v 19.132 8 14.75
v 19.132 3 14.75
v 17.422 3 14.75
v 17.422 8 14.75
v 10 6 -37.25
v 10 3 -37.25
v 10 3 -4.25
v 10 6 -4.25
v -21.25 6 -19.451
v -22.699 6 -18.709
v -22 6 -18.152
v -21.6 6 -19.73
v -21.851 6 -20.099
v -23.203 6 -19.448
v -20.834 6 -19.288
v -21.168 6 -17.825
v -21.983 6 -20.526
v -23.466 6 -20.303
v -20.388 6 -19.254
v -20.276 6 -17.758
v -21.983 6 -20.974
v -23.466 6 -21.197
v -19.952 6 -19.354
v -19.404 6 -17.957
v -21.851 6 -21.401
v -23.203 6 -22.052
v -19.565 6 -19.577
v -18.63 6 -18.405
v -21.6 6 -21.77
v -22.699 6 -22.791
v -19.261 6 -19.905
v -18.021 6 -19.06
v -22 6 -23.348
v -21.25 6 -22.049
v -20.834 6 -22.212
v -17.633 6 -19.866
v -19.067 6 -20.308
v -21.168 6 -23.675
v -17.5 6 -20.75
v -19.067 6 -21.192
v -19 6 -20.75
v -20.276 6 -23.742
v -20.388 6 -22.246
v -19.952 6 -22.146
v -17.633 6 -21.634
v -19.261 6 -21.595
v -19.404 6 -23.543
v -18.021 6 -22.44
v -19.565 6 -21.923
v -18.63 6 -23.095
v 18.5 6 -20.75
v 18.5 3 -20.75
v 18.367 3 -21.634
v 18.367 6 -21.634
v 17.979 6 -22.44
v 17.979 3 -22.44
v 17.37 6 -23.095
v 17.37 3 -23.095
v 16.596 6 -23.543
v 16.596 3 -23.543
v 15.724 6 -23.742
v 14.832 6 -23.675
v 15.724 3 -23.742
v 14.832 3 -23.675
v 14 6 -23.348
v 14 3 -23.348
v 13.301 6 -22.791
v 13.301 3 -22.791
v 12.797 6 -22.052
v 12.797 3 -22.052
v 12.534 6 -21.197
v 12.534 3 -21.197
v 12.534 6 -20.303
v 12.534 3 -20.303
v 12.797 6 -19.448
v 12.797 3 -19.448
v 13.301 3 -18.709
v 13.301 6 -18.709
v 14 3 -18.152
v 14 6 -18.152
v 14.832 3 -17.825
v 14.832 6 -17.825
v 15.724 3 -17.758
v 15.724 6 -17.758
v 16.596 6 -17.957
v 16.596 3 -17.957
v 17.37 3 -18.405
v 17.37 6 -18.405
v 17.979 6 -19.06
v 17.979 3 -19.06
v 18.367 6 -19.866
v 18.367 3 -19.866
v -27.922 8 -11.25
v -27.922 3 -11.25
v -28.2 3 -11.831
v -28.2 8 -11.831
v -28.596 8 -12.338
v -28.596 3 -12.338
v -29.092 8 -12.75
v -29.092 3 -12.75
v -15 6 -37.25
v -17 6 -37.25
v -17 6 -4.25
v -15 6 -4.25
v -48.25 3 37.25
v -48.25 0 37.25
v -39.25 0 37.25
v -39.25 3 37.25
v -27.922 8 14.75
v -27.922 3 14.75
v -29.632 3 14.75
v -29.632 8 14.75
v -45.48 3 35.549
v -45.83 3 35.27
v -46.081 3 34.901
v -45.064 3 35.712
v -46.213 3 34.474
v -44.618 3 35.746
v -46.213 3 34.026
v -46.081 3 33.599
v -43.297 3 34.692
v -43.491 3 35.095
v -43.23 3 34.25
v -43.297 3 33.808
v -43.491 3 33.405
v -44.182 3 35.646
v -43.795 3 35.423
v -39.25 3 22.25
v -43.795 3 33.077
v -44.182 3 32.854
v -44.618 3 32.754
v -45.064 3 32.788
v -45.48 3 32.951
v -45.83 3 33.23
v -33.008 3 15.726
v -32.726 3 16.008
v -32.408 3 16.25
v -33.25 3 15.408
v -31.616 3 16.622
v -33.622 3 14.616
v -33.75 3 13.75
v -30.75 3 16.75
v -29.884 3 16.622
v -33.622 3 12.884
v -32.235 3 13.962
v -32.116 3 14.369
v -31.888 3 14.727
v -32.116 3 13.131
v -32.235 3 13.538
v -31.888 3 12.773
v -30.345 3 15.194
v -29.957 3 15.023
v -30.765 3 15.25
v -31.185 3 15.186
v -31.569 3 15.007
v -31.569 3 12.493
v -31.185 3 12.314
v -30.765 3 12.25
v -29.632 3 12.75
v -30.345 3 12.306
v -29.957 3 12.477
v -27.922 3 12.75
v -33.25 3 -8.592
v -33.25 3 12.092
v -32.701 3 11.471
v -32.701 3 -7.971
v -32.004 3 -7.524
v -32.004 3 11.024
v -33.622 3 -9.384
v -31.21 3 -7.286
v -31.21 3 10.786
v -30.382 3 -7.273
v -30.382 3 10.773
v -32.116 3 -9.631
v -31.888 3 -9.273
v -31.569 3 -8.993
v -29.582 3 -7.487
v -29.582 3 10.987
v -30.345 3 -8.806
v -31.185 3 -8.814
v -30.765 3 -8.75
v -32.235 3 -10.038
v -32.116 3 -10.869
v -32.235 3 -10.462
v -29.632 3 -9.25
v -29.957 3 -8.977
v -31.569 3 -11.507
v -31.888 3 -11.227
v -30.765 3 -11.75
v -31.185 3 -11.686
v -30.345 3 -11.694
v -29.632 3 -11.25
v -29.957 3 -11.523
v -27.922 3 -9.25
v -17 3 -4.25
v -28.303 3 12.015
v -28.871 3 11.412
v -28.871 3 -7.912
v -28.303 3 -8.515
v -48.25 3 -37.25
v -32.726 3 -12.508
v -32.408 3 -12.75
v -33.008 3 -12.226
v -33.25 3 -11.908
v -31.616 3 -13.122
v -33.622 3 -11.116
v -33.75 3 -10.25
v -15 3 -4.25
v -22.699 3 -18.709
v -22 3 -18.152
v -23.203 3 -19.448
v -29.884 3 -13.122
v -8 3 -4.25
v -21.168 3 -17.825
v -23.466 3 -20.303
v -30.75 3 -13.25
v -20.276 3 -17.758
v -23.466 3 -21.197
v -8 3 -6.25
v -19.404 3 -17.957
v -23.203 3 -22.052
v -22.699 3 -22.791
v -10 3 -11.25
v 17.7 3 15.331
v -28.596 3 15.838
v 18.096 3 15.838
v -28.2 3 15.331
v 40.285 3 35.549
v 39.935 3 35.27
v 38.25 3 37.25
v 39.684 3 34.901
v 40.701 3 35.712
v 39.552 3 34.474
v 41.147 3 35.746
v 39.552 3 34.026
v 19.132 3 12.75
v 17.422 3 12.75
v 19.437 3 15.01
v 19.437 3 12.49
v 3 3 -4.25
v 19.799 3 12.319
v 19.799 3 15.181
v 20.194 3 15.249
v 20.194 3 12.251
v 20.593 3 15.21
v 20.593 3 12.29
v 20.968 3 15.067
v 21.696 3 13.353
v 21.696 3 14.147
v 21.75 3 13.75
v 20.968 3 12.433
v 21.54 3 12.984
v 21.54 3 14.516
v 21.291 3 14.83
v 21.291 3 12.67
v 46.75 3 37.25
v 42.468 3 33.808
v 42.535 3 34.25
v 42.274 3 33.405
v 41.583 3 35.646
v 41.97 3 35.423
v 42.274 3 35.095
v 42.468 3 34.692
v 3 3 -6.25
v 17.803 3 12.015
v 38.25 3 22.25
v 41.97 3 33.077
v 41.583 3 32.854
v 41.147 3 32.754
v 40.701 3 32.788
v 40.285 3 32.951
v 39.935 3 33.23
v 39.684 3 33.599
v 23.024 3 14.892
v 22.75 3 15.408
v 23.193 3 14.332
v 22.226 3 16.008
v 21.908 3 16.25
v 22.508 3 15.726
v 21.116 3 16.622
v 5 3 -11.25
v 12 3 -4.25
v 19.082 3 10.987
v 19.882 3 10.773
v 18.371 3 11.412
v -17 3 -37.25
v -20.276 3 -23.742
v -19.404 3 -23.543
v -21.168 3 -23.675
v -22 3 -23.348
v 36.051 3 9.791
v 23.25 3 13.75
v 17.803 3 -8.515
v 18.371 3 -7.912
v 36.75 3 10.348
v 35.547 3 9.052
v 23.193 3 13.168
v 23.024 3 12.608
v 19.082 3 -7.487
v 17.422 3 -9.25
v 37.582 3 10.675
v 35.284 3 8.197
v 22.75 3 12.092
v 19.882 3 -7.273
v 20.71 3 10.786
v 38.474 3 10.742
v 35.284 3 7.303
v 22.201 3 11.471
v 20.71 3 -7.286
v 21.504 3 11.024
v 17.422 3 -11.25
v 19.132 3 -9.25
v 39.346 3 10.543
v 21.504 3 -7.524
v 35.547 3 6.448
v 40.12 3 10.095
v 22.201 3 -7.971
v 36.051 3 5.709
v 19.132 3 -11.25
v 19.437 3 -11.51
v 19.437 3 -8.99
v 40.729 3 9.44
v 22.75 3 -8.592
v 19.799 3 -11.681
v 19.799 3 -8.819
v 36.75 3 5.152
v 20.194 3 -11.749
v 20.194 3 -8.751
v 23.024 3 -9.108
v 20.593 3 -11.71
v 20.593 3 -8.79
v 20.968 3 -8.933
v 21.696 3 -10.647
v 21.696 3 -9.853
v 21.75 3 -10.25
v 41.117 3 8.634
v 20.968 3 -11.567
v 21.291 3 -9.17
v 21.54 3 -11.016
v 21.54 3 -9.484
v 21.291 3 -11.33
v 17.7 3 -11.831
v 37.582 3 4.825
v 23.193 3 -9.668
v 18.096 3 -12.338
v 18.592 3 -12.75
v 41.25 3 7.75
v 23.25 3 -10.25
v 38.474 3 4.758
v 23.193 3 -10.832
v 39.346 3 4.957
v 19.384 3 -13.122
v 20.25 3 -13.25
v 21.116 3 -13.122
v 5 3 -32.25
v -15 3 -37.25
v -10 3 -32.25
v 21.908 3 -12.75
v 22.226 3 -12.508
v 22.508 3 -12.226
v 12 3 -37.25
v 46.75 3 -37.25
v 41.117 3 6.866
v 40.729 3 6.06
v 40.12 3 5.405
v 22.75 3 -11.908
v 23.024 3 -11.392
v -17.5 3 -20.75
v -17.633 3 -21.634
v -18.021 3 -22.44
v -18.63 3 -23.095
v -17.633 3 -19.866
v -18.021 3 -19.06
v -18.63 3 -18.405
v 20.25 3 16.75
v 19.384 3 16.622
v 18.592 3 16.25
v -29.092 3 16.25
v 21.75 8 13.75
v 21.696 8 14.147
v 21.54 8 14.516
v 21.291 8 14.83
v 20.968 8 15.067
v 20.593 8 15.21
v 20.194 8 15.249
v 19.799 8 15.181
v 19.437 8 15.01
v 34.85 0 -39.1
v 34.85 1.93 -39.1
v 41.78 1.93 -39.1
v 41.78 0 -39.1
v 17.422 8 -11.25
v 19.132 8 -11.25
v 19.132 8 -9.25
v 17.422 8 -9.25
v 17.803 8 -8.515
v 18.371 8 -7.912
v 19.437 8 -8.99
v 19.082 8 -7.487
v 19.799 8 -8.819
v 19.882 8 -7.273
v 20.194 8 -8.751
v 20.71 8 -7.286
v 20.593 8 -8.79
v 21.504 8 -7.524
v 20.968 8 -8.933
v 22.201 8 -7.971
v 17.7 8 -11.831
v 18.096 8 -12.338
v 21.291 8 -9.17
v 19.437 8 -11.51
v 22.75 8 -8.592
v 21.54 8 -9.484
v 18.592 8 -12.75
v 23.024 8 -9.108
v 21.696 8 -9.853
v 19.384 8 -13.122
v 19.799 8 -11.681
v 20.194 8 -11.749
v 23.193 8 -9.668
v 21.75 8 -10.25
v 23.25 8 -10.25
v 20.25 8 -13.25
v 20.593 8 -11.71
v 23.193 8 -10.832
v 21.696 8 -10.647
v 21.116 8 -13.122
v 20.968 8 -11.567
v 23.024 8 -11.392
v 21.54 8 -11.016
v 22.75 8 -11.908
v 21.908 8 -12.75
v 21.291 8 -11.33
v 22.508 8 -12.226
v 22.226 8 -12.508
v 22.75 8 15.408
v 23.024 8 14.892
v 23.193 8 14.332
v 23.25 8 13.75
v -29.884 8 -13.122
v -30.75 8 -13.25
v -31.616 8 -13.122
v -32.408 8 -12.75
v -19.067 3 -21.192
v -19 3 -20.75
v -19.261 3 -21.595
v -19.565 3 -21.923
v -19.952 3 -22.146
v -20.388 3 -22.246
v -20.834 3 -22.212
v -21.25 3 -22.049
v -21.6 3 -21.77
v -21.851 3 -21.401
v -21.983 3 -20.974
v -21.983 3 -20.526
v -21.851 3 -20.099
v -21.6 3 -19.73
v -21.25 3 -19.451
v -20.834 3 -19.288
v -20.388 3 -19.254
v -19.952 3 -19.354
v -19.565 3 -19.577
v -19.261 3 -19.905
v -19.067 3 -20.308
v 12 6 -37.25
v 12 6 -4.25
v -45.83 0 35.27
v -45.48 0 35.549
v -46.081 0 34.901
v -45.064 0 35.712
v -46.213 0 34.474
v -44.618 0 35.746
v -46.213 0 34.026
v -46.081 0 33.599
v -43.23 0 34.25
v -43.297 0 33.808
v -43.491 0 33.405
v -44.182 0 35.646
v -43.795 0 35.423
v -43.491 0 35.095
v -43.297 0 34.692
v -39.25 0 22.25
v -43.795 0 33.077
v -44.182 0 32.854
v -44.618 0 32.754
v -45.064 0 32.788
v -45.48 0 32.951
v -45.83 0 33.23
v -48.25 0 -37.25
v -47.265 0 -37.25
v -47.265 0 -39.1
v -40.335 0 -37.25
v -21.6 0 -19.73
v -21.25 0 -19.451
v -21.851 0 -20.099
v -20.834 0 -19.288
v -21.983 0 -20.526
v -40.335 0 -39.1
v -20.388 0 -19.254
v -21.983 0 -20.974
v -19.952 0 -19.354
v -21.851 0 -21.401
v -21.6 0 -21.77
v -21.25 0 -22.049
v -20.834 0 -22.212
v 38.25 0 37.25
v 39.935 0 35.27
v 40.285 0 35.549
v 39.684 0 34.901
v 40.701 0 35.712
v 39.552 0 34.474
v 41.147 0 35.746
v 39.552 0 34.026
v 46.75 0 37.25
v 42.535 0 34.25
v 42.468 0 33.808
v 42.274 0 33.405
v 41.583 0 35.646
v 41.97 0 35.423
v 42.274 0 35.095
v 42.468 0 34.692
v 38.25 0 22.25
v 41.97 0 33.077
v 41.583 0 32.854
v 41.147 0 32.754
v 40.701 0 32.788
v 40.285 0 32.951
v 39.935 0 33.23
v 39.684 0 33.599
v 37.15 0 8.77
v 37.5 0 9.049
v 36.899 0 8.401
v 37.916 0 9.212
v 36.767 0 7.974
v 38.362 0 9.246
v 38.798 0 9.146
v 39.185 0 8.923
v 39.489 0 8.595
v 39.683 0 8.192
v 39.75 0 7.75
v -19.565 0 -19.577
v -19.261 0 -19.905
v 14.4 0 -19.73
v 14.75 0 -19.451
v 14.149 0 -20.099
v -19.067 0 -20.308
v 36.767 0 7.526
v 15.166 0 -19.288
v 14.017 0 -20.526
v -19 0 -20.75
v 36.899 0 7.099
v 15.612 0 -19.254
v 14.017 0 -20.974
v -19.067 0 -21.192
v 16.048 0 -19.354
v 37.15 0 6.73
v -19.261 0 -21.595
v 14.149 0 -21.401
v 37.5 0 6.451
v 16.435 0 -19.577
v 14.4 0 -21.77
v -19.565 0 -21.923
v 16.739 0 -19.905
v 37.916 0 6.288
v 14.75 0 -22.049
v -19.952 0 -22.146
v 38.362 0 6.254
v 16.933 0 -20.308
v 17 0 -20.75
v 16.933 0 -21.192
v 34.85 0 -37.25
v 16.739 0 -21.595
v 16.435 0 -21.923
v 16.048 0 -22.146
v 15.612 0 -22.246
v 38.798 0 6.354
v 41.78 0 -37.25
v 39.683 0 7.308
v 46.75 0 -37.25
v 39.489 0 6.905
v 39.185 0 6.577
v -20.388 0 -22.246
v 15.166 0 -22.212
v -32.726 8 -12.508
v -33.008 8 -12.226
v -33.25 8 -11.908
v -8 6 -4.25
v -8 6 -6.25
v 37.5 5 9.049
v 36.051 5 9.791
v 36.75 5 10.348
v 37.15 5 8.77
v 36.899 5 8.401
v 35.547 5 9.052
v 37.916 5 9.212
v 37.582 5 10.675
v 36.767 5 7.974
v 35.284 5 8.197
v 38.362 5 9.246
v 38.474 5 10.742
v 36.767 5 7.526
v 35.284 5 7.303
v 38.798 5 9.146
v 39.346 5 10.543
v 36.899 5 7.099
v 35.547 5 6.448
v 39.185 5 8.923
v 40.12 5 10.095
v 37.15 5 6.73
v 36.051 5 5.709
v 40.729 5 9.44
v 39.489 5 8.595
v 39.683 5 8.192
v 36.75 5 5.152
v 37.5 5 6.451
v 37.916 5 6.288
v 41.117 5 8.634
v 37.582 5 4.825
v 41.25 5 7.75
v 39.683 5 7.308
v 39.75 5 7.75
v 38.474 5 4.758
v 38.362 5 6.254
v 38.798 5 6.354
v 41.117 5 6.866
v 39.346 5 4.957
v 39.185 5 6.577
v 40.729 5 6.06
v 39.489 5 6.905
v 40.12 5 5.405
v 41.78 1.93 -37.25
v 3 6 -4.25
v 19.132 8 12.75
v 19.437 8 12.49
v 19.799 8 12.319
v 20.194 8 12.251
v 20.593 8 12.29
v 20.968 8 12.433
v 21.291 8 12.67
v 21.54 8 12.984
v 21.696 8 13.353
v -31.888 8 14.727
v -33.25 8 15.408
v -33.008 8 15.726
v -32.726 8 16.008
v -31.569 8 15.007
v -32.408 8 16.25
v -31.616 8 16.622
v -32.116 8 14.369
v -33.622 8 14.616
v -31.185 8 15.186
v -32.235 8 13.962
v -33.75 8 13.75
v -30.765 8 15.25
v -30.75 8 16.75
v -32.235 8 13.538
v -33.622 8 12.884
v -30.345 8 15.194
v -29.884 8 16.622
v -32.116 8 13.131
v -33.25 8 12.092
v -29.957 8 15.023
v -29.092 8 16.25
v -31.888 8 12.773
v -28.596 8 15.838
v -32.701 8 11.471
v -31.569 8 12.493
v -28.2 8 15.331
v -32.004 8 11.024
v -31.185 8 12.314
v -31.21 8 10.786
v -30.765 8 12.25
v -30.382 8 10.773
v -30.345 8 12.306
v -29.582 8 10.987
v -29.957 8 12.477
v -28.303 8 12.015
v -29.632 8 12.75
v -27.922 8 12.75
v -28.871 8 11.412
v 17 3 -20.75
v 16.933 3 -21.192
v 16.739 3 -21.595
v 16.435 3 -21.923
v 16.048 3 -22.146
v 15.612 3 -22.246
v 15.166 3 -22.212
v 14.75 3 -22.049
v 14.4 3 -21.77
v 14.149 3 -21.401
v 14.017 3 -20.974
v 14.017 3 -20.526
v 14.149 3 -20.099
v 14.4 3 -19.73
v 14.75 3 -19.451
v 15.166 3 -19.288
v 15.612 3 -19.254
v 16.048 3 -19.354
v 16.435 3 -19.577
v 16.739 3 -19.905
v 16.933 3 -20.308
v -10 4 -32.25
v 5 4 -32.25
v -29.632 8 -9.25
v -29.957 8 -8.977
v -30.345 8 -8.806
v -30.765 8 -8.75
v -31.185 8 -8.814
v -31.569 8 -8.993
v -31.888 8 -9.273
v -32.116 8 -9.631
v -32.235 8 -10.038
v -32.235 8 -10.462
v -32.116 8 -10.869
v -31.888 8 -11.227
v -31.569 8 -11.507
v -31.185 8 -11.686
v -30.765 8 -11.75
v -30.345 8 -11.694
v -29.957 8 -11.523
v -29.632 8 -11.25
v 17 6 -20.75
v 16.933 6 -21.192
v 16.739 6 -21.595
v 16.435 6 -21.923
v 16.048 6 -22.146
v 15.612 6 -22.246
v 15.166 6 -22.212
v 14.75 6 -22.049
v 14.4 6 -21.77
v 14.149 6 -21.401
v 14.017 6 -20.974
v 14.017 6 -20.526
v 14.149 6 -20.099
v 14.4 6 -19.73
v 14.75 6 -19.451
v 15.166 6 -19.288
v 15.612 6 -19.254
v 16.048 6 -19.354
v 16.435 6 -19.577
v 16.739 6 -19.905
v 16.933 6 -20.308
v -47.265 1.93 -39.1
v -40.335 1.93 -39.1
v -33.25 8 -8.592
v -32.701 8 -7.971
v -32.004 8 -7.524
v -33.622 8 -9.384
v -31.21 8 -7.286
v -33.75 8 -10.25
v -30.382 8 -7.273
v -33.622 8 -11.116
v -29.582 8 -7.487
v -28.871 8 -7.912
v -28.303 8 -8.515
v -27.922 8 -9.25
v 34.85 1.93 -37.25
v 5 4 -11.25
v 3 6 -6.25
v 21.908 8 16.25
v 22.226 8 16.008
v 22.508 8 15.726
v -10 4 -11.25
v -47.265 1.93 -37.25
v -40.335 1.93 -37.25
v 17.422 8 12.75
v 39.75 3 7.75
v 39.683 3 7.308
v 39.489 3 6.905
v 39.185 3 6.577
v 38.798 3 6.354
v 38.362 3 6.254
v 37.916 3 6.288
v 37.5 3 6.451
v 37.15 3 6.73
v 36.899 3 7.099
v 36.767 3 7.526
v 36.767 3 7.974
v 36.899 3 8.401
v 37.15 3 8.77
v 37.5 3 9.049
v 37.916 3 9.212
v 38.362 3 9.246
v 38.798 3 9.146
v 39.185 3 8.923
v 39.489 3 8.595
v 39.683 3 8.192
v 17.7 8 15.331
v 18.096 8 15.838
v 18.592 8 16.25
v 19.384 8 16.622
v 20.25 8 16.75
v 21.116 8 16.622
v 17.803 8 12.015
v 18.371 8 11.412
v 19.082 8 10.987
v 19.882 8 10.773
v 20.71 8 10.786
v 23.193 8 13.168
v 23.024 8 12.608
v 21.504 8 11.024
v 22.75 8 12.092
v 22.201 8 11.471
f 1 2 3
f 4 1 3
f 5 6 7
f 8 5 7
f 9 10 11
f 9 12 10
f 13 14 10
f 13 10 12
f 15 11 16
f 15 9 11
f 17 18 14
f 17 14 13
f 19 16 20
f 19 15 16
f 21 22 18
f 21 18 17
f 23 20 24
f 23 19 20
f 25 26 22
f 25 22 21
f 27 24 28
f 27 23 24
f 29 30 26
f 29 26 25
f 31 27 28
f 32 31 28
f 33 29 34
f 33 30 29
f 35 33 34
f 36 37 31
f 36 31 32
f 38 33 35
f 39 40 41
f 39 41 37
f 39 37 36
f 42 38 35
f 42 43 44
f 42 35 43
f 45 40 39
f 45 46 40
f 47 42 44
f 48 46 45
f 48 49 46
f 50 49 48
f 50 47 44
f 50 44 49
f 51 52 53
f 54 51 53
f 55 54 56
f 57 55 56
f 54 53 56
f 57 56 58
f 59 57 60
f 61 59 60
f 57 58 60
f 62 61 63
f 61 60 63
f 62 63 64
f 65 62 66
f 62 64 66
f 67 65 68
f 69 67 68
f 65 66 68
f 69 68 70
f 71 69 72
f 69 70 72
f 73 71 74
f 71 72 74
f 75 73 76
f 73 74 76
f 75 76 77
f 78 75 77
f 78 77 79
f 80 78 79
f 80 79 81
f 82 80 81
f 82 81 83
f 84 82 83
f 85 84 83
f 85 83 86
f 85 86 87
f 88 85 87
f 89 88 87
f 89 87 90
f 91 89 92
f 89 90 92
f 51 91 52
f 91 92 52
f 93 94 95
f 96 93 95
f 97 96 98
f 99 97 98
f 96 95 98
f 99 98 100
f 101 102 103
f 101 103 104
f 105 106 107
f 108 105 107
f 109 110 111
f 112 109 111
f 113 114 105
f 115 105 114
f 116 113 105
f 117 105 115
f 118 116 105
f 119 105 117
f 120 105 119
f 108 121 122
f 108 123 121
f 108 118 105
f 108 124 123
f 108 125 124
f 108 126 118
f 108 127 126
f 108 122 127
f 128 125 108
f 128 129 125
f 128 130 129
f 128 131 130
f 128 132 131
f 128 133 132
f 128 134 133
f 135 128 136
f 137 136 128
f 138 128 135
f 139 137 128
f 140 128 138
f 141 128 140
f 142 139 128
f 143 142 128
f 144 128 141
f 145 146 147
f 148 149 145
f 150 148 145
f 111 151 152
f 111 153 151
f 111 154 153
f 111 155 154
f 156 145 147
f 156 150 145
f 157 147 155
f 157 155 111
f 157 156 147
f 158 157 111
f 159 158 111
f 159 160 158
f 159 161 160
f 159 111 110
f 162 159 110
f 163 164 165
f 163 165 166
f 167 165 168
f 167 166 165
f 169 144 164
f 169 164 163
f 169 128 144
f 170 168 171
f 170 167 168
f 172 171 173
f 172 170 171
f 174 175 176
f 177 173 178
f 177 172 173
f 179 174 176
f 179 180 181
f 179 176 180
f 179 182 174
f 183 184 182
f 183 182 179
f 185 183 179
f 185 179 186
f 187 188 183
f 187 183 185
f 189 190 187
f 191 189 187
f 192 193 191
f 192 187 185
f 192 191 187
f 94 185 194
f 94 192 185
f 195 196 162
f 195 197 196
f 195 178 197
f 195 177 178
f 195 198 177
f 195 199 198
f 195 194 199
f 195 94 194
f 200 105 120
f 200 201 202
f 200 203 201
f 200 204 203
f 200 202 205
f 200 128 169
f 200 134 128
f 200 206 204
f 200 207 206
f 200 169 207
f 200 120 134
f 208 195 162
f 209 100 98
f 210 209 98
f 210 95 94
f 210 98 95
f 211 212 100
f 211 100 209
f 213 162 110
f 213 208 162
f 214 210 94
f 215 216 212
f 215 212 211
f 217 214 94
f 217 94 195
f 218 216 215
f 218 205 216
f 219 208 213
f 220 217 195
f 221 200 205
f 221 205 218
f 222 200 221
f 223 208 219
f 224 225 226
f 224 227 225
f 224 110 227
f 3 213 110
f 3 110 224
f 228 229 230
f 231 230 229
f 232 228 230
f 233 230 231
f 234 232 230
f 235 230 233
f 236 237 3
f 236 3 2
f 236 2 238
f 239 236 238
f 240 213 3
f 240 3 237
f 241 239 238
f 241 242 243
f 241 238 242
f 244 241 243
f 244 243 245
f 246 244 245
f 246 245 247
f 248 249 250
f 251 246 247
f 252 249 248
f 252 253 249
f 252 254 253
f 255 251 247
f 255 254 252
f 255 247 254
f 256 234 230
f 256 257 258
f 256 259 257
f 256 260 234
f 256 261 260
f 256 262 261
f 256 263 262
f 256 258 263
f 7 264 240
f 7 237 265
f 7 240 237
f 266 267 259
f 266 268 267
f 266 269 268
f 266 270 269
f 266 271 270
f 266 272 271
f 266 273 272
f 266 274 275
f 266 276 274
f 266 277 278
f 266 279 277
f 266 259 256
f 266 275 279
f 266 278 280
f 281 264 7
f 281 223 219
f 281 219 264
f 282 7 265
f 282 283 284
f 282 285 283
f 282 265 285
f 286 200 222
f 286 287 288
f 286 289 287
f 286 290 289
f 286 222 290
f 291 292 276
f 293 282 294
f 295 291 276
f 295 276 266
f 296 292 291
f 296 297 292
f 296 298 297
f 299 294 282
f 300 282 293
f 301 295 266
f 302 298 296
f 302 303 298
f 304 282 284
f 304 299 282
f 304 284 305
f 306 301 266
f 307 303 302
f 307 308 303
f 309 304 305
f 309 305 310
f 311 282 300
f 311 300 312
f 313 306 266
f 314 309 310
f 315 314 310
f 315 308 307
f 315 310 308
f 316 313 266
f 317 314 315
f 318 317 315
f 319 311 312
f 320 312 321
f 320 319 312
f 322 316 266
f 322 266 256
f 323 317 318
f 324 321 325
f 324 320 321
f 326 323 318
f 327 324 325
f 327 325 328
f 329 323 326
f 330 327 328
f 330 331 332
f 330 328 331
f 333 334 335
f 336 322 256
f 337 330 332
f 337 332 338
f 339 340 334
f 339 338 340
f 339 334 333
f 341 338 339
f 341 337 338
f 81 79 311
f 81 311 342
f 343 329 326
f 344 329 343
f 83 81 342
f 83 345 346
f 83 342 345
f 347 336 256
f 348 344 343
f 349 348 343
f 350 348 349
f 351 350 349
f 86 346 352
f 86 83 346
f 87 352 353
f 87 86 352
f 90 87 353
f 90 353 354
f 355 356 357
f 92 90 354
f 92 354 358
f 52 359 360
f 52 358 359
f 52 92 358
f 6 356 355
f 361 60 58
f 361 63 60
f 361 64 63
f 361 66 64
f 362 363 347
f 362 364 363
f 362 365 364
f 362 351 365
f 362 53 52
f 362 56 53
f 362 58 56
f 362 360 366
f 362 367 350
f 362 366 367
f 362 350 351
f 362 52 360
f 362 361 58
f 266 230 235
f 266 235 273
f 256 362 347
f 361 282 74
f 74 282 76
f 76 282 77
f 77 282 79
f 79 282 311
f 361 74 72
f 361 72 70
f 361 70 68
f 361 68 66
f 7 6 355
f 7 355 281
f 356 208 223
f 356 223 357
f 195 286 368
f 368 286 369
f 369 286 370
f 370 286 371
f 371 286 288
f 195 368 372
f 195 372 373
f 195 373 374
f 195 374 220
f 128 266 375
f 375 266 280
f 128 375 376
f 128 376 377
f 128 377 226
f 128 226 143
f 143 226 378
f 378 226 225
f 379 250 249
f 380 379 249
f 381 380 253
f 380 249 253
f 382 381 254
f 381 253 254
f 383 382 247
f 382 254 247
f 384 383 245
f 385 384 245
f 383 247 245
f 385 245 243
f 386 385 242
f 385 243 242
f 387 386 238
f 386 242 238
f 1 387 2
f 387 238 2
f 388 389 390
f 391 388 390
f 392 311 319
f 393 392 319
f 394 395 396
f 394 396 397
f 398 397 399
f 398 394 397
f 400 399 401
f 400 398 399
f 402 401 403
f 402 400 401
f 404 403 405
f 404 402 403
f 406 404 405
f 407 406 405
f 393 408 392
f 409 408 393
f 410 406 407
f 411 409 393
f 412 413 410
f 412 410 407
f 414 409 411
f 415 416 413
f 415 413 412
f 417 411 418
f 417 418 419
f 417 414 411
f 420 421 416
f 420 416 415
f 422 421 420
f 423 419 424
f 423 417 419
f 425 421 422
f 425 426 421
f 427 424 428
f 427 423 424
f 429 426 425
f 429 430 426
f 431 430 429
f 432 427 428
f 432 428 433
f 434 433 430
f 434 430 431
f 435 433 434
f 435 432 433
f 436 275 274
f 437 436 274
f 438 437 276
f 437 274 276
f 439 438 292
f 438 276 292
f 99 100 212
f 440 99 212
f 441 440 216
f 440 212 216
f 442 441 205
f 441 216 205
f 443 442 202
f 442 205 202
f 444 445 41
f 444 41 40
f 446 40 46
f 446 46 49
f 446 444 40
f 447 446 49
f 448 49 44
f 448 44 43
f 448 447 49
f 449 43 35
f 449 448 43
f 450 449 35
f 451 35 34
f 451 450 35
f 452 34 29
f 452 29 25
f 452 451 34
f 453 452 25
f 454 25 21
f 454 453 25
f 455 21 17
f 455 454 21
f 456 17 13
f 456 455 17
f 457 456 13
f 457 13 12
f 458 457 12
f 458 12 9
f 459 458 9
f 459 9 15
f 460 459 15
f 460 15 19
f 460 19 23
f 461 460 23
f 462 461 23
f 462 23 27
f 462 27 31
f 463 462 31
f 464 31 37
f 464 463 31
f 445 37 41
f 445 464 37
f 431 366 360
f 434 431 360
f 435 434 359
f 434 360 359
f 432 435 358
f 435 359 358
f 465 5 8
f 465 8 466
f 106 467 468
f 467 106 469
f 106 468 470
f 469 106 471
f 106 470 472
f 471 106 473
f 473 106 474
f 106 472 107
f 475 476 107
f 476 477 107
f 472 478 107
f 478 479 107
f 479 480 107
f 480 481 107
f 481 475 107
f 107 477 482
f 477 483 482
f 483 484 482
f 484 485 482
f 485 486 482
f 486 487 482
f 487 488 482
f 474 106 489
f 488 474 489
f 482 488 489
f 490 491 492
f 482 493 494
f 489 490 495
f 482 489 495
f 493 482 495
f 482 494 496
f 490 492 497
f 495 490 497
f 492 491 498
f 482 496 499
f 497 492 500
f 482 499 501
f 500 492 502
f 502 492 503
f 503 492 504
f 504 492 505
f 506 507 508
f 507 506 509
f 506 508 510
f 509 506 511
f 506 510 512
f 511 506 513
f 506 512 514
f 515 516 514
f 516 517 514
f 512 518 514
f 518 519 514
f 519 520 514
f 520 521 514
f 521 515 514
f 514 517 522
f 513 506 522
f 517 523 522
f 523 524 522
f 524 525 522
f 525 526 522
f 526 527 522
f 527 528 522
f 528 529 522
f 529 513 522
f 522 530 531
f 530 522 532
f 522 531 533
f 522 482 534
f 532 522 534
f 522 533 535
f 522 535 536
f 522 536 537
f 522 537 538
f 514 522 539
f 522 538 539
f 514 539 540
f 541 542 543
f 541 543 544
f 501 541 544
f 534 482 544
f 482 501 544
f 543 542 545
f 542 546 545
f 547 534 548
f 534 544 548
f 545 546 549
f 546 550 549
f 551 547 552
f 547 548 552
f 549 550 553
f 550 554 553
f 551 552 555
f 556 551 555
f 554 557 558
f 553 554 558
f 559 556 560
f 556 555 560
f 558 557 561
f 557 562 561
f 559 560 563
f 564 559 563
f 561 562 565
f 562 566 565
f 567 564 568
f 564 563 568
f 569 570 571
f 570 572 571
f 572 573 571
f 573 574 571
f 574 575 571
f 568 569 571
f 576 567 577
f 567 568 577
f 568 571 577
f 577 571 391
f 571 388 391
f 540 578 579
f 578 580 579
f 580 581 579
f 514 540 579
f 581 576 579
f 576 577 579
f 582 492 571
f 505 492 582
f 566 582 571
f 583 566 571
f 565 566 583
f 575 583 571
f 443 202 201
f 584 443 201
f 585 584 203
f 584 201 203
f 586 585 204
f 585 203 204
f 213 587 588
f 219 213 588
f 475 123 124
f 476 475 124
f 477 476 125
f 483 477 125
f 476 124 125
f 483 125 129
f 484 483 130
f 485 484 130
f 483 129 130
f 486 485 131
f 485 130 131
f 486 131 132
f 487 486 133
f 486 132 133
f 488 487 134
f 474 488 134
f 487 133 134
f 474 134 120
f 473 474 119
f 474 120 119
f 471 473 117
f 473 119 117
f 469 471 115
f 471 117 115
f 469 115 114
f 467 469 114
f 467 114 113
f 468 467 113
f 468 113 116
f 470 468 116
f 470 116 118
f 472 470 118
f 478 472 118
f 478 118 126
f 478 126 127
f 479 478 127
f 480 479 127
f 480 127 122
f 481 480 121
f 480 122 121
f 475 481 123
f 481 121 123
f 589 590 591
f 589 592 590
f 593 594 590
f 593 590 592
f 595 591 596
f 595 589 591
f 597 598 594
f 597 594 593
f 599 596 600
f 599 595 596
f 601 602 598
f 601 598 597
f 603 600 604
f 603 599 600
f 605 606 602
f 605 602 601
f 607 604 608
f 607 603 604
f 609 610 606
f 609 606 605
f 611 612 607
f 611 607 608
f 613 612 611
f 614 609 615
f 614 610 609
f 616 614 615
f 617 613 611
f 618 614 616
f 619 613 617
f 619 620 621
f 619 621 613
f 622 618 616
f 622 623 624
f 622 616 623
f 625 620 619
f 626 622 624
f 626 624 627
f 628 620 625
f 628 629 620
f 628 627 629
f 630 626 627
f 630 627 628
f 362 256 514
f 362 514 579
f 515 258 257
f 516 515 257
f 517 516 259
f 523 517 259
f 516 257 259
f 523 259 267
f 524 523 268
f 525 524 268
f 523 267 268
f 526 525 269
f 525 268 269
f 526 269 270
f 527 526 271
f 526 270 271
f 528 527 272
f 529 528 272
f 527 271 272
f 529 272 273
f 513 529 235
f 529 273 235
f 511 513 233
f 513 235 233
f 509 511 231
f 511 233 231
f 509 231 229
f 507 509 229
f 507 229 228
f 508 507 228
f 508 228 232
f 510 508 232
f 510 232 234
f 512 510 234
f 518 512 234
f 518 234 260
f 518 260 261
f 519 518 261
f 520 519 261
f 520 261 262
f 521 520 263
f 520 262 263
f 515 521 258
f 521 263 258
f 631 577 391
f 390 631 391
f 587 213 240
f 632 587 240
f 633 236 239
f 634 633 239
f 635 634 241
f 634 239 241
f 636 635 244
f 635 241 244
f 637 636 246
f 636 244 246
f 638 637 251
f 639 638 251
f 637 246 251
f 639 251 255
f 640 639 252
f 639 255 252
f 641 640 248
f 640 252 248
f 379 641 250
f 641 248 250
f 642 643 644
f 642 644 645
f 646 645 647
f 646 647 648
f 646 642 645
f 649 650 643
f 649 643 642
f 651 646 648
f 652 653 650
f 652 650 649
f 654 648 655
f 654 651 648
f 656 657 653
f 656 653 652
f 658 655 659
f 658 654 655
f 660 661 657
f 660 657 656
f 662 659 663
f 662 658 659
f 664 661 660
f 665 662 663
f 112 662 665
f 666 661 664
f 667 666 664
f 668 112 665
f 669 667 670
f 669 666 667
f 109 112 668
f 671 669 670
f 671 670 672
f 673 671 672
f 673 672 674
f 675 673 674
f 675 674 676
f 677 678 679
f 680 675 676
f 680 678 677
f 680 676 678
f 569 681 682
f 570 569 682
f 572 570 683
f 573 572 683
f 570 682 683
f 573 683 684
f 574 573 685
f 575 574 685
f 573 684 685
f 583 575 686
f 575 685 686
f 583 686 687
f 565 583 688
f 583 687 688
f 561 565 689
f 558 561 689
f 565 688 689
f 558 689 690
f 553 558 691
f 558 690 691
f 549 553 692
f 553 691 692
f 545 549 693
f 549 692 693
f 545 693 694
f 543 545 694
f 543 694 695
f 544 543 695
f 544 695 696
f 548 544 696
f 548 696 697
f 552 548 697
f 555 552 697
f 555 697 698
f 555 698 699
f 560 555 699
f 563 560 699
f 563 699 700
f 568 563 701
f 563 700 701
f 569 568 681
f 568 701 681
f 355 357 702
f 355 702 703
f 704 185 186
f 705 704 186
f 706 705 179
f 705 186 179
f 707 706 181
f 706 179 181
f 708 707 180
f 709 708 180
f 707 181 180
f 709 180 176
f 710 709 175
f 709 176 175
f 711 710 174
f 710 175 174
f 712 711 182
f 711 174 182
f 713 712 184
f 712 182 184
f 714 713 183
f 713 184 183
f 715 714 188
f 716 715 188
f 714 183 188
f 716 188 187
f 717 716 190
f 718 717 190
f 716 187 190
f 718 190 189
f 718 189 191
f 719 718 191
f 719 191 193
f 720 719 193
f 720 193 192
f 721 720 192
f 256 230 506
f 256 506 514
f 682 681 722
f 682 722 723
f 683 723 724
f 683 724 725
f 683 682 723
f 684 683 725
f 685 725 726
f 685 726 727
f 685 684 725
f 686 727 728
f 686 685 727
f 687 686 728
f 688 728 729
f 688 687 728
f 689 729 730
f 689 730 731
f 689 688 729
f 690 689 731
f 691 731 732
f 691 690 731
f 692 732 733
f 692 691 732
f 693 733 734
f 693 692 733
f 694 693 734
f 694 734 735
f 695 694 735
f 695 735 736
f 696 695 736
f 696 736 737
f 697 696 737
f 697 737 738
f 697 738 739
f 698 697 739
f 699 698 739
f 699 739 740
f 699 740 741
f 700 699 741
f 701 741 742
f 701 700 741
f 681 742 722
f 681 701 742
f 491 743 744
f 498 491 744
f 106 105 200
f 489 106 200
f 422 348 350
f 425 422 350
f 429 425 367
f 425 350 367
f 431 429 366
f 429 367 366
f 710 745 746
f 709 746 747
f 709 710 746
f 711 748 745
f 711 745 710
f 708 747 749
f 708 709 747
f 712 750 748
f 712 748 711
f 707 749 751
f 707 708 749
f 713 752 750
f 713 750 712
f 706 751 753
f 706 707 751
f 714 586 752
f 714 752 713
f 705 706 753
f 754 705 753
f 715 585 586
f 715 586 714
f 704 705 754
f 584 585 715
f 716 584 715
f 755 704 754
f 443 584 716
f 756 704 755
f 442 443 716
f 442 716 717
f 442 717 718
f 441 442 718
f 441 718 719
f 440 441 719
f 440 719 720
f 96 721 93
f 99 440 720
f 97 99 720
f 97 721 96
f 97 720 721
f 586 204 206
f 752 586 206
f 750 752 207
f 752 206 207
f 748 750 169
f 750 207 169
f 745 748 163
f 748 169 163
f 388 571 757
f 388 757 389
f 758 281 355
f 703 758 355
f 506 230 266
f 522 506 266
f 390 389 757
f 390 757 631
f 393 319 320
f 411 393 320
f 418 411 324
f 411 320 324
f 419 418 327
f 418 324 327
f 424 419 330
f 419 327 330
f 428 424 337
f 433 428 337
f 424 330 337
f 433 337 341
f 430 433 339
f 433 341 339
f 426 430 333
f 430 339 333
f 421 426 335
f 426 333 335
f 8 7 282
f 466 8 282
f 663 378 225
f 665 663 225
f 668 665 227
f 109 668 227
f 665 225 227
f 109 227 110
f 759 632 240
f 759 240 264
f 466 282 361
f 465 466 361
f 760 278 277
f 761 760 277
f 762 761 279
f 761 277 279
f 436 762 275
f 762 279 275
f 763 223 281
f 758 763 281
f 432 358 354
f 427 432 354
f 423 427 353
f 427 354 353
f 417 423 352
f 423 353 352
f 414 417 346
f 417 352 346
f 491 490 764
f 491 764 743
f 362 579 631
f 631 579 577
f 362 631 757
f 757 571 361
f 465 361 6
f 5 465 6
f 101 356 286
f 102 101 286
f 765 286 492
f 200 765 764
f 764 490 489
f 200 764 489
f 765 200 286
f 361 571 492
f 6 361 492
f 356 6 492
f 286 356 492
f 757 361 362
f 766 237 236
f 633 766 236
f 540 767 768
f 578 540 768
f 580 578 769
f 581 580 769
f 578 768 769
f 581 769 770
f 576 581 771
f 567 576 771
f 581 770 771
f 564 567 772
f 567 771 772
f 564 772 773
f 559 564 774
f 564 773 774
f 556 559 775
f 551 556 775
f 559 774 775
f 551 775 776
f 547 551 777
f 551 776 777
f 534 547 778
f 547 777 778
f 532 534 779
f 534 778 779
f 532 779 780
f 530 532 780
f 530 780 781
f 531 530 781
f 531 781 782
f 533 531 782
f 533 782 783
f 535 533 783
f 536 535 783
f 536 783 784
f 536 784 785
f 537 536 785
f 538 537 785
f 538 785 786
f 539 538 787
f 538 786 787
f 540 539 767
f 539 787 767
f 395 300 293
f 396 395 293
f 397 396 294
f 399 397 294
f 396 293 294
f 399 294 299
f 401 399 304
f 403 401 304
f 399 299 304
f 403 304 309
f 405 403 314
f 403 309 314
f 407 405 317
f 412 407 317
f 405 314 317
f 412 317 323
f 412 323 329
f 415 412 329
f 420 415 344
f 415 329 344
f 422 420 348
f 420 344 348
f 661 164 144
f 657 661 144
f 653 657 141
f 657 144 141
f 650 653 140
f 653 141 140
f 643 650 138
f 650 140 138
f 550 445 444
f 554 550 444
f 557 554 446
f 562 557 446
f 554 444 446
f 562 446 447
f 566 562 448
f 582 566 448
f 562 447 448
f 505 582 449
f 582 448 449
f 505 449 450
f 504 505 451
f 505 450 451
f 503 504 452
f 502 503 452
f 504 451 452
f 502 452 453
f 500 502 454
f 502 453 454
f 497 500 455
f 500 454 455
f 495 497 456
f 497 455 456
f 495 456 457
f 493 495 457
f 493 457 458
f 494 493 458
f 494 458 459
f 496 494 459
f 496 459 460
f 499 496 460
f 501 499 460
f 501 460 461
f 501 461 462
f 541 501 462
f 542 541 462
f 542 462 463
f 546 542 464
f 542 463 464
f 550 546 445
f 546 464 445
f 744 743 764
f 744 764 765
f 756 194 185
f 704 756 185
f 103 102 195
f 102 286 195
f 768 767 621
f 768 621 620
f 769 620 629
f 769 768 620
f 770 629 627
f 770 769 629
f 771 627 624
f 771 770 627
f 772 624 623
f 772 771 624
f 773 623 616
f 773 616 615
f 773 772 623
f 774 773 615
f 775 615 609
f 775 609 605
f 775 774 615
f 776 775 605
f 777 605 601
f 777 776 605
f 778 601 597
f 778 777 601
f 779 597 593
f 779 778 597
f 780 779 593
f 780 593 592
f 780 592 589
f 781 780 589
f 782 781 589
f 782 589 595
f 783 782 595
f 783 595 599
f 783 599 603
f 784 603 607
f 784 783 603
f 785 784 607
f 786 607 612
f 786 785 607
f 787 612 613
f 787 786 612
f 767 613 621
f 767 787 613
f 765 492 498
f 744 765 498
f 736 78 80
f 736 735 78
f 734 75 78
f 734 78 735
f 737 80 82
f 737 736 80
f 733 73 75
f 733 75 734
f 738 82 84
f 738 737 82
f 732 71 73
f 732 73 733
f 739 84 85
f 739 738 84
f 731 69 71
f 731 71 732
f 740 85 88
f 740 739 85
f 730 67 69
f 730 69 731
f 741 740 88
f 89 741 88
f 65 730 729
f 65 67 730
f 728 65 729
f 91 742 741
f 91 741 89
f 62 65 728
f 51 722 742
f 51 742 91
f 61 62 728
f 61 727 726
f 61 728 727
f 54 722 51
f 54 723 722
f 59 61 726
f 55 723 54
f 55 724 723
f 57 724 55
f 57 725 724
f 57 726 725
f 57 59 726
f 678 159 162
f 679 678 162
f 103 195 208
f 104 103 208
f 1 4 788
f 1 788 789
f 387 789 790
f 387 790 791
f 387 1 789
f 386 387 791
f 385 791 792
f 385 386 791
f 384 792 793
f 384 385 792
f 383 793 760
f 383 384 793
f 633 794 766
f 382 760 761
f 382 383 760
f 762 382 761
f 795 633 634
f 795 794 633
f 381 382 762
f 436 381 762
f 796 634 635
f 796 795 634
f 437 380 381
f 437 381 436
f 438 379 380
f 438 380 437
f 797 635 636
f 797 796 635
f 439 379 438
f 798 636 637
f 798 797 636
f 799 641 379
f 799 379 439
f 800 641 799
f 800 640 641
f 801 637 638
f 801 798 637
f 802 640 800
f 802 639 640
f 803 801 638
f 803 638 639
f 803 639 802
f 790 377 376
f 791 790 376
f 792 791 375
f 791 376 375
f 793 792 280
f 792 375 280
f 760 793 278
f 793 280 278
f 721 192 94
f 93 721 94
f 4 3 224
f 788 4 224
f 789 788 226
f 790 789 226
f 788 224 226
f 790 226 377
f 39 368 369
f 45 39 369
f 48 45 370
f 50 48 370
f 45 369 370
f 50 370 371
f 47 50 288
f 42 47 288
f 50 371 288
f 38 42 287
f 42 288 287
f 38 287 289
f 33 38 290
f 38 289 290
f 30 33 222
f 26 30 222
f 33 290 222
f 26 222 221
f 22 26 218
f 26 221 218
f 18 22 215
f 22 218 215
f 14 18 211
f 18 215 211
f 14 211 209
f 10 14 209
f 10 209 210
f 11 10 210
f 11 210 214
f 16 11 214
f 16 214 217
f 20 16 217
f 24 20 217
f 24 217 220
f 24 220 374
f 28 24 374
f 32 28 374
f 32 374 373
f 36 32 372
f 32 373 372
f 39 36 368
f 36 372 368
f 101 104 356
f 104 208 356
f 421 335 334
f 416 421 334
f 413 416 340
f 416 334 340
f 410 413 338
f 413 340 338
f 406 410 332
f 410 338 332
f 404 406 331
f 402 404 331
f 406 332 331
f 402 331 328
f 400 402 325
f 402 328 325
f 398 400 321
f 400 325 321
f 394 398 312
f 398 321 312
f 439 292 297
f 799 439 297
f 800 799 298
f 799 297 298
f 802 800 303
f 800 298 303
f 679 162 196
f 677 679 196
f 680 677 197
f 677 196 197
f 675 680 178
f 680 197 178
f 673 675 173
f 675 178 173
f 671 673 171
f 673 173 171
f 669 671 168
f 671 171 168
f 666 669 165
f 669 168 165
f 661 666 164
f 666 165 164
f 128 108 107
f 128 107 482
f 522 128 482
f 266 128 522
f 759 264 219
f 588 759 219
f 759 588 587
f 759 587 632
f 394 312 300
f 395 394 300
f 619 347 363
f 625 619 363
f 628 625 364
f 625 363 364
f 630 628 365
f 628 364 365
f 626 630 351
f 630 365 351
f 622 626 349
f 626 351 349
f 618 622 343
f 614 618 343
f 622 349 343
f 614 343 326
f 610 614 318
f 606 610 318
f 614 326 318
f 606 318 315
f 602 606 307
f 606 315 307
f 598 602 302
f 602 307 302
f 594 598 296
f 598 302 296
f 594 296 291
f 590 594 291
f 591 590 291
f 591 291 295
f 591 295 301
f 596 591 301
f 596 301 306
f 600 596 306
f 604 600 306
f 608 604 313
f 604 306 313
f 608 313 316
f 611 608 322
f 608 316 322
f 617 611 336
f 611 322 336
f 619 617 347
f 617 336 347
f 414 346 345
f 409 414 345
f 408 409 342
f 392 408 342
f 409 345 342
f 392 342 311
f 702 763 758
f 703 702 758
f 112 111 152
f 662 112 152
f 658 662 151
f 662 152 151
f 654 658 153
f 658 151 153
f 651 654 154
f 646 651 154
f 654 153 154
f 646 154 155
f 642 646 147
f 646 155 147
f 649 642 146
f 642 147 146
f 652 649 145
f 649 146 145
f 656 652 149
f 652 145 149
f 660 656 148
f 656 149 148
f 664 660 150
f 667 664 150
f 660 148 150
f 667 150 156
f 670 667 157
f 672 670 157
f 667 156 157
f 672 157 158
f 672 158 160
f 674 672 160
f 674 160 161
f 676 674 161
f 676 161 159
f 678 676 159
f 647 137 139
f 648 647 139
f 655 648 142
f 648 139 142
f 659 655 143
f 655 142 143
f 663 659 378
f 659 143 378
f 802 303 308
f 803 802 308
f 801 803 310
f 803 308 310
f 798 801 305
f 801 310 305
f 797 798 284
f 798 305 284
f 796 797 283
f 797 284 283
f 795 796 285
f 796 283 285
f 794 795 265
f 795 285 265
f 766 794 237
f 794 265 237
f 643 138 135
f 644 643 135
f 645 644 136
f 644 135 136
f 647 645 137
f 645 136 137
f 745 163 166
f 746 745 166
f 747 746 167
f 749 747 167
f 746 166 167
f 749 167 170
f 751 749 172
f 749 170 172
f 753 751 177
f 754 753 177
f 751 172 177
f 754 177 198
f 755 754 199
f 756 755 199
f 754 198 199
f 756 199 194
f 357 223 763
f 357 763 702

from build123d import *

# Parameters (mm, degrees)
SKETCH1_W            = 106.5
SKETCH1_H            = 74.5
BOSS_EXTRUDE1_DEPTH  = 3
SKETCH2_W            = 6.93
SKETCH2_H            = 1.85
BOSS_EXTRUDE2_DEPTH  = 3
SKETCH3_W            = 6.93
SKETCH3_H            = 1.85
CUT_EXTRUDE1_DEPTH   = 1.07
SKETCH4_W            = 5
SKETCH4_H            = 64.5
SKETCH4_W_2          = 78.5
SKETCH4_H_2          = 15
CUT_EXTRUDE2_DEPTH   = 3
SKETCH5_R            = 3.5
CUT_EXTRUDE3_DEPTH   = 3
BOSS_EXTRUDE5_DEPTH  = 5
SKETCH9_R            = 3
SKETCH9_R_2          = 1.5
BOSS_EXTRUDE6_DEPTH  = 2
SKETCH10_W           = 15
SKETCH10_H           = 21
BOSS_EXTRUDE7_DEPTH  = 1
BOSS_EXTRUDE8_DEPTH  = 2
SKETCH12_W           = 5
SKETCH12_H           = 5
CUT_EXTRUDE4_DEPTH   = 4
SKETCH14_W           = 4
SKETCH14_H           = 75.31405771
CUT_EXTRUDE5_DEPTH   = 10
SKETCH15_R           = 3
SKETCH15_R_2         = 1.5
BOSS_EXTRUDE9_DEPTH  = 3
SKETCH16_R           = 1.5
CUT_EXTRUDE6_DEPTH   = 3
SKETCH17_R           = 1.5
CUT_EXTRUDE7_DEPTH   = 3
SKETCH18_W           = 7
SKETCH18_H           = 2
CUT_EXTRUDE8_DEPTH   = 3
SKETCH19_R           = 1.5
CUT_EXTRUDE9_DEPTH   = 3
SKETCH20_W           = 3
SKETCH20_H           = 74.5
CUT_EXTRUDE10_DEPTH  = 8
SKETCH21_W           = 1
SKETCH21_H           = 15
BOSS_EXTRUDE10_DEPTH = 3


with BuildPart() as part:
    # Sketch1 → Boss-Extrude1 (new body)
    with BuildSketch(Plane(origin=(0, 0, 0), x_dir=(1, 0, 0), z_dir=(0, 1, 0))):
        Rectangle(SKETCH1_W, SKETCH1_H)
    extrude(amount=BOSS_EXTRUDE1_DEPTH)

    # Sketch2 → Boss-Extrude2 (add)
    with BuildSketch(Plane(origin=(0, 3, 0), x_dir=(1, 0, 0), z_dir=(0, 1, 0))):
        with Locations((-43.8, 38.175)):
            Rectangle(SKETCH2_W, SKETCH2_H)
        with Locations((38.315, 38.175)):
            Rectangle(SKETCH2_W, SKETCH2_H)
    extrude(amount=-BOSS_EXTRUDE2_DEPTH)

    # Sketch3 → Cut-Extrude1 (cut)
    with BuildSketch(Plane(origin=(0, 3, 0), x_dir=(1, 0, 0), z_dir=(0, 1, 0))):
        with Locations((-43.8, 38.175)):
            Rectangle(SKETCH3_W, SKETCH3_H)
        with Locations((38.315, 38.175)):
            Rectangle(SKETCH3_W, SKETCH3_H)
    extrude(amount=-CUT_EXTRUDE1_DEPTH, mode=Mode.SUBTRACT)

    # Sketch4 → Cut-Extrude2 (cut)
    with BuildSketch(Plane(origin=(0, 3, 0), x_dir=(1, 0, 0), z_dir=(0, 1, 0))):
        with Locations((-50.75, 0)):
            Rectangle(SKETCH4_W, SKETCH4_H)
        with Locations((0, -29.75)):
            Rectangle(SKETCH4_W_2, SKETCH4_H_2)
    extrude(amount=-CUT_EXTRUDE2_DEPTH, mode=Mode.SUBTRACT)

    # Sketch5 → Cut-Extrude3 (cut)
    with BuildSketch(Plane(origin=(0, 3, 0), x_dir=(1, 0, 0), z_dir=(0, 1, 0))):
        with Locations((-53.25, -37.25)):
            Circle(SKETCH5_R)
        with Locations((53.25, -37.25)):
            Circle(SKETCH5_R)
        with Locations((53.25, 37.25)):
            Circle(SKETCH5_R)
        with Locations((-53.25, 37.25)):
            Circle(SKETCH5_R)
    extrude(amount=-CUT_EXTRUDE3_DEPTH, mode=Mode.SUBTRACT)

    # Sketch6 → Boss-Extrude5 (add)
    with BuildSketch(Plane(origin=(0, 3, 0), x_dir=(1, 0, 0), z_dir=(0, 1, 0))):
        with BuildLine():
            Line((-29.091687605, 12.75), (-32.408312395, 12.75))
            ThreePointArc((-32.408312395, 12.75), (-32.871320344, 12.371320344), (-33.25, 11.908312395))
            Line((-33.25, 11.908312395), (-33.25, 8.591687605))
            ThreePointArc((-33.25, 8.591687605), (-30.382155065, 7.272637055), (-27.921572875, 9.25))
            Line((-27.921572875, 9.25), (-29.631966011, 9.25))
            ThreePointArc((-29.631966011, 9.25), (-32.25, 10.25), (-29.631966011, 11.25))
            Line((-29.631966011, 11.25), (-27.921572875, 11.25))
            ThreePointArc((-27.921572875, 11.25), (-28.384580824, 12.09520788), (-29.091687605, 12.75))
        make_face()
        with BuildLine():
            Line((-33.25, 8.591687605), (-33.25, 11.908312395))
            ThreePointArc((-33.25, 11.908312395), (-33.75, 10.25), (-33.25, 8.591687605))
        make_face()
        with BuildLine():
            ThreePointArc((-29.091687605, 12.75), (-30.75, 13.25), (-32.408312395, 12.75))
            Line((-32.408312395, 12.75), (-29.091687605, 12.75))
        make_face()
        with BuildLine():
            ThreePointArc((-27.921572875, -12.75), (-30.382155065, -10.772637055), (-33.25, -12.091687605))
            Line((-33.25, -12.091687605), (-33.25, -15.408312395))
            ThreePointArc((-33.25, -15.408312395), (-32.871320344, -15.871320344), (-32.408312395, -16.25))
            Line((-32.408312395, -16.25), (-29.091687605, -16.25))
            ThreePointArc((-29.091687605, -16.25), (-28.384580824, -15.59520788), (-27.921572875, -14.75))
            Line((-27.921572875, -14.75), (-29.631966011, -14.75))
            ThreePointArc((-29.631966011, -14.75), (-32.25, -13.75), (-29.631966011, -12.75))
            Line((-29.631966011, -12.75), (-27.921572875, -12.75))
        make_face()
        with BuildLine():
            Line((-33.25, -15.408312395), (-33.25, -12.091687605))
            ThreePointArc((-33.25, -12.091687605), (-33.75, -13.75), (-33.25, -15.408312395))
        make_face()
        with BuildLine():
            Line((-29.091687605, -16.25), (-32.408312395, -16.25))
            ThreePointArc((-32.408312395, -16.25), (-30.75, -16.75), (-29.091687605, -16.25))
        make_face()
        with BuildLine():
            Line((22.75, -15.408312395), (22.75, -12.091687605))
            ThreePointArc((22.75, -12.091687605), (19.882155065, -10.772637055), (17.421572875, -12.75))
            Line((17.421572875, -12.75), (19.131966011, -12.75))
            ThreePointArc((19.131966011, -12.75), (20.785233135, -12.348741462), (21.75, -13.75))
            ThreePointArc((21.75, -13.75), (20.785233135, -15.151258538), (19.131966011, -14.75))
            Line((19.131966011, -14.75), (17.421572875, -14.75))
            ThreePointArc((17.421572875, -14.75), (17.884580824, -15.59520788), (18.591687605, -16.25))
            Line((18.591687605, -16.25), (21.908312395, -16.25))
            ThreePointArc((21.908312395, -16.25), (22.371320344, -15.871320344), (22.75, -15.408312395))
        make_face()
        with BuildLine():
            Line((21.908312395, -16.25), (18.591687605, -16.25))
            ThreePointArc((18.591687605, -16.25), (20.25, -16.75), (21.908312395, -16.25))
        make_face()
        with BuildLine():
            ThreePointArc((23.25, -13.75), (23.122281323, -12.883974596), (22.75, -12.091687605))
            Line((22.75, -12.091687605), (22.75, -15.408312395))
            ThreePointArc((22.75, -15.408312395), (23.122281323, -14.616025404), (23.25, -13.75))
        make_face()
        with BuildLine():
            Line((21.908312395, 12.75), (18.591687605, 12.75))
            ThreePointArc((18.591687605, 12.75), (17.884580824, 12.09520788), (17.421572875, 11.25))
            Line((17.421572875, 11.25), (19.131966011, 11.25))
            ThreePointArc((19.131966011, 11.25), (20.785233135, 11.651258538), (21.75, 10.25))
            ThreePointArc((21.75, 10.25), (20.785233135, 8.848741462), (19.131966011, 9.25))
            Line((19.131966011, 9.25), (17.421572875, 9.25))
            ThreePointArc((17.421572875, 9.25), (19.882155065, 7.272637055), (22.75, 8.591687605))
            Line((22.75, 8.591687605), (22.75, 11.908312395))
            ThreePointArc((22.75, 11.908312395), (22.371320344, 12.371320344), (21.908312395, 12.75))
        make_face()
        with BuildLine():
            ThreePointArc((23.25, 10.25), (23.122281323, 11.116025404), (22.75, 11.908312395))
            Line((22.75, 11.908312395), (22.75, 8.591687605))
            ThreePointArc((22.75, 8.591687605), (23.122281323, 9.383974596), (23.25, 10.25))
        make_face()
        with BuildLine():
            ThreePointArc((21.908312395, 12.75), (20.25, 13.25), (18.591687605, 12.75))
            Line((18.591687605, 12.75), (21.908312395, 12.75))
        make_face()
    extrude(amount=BOSS_EXTRUDE5_DEPTH)

    # Sketch9 → Boss-Extrude6 (add)
    with BuildSketch(Plane(origin=(0, 3, 0), x_dir=(1, 0, 0), z_dir=(0, 1, 0))):
        with Locations((38.25, -7.75)):
            Circle(SKETCH9_R)
        with Locations((38.25, -7.75)):
            Circle(SKETCH9_R_2, mode=Mode.SUBTRACT)
    extrude(amount=BOSS_EXTRUDE6_DEPTH)

    # Sketch10 → Boss-Extrude7 (add)
    with BuildSketch(Plane(origin=(0, 3, 0), x_dir=(1, 0, 0), z_dir=(0, 1, 0))):
        with Locations((-2.5, 21.75)):
            Rectangle(SKETCH10_W, SKETCH10_H)
        Polygon((-15, 6.25), (-15, 37.25), (-17, 37.25), (-17, 4.25), (12, 4.25), (12, 37.25), (10, 37.25), (10, 6.25), align=None)
    extrude(amount=BOSS_EXTRUDE7_DEPTH)

    # Sketch11 → Boss-Extrude8 (add)
    with BuildSketch(Plane(origin=(0, 4, 0), x_dir=(1, 0, 0), z_dir=(0, 1, 0))):
        Polygon((-15, 37.25), (-17, 37.25), (-17, 4.25), (12, 4.25), (12, 37.25), (10, 37.25), (10, 6.25), (-15, 6.25), align=None)
    extrude(amount=BOSS_EXTRUDE8_DEPTH)

    # Sketch12 → Cut-Extrude4 (cut)
    with BuildSketch(Plane(origin=(0, 3, 0), x_dir=(1, 0, 0), z_dir=(0, 1, 0))):
        with Locations((-50.75, 34.75)):
            Rectangle(SKETCH12_W, SKETCH12_H)
        with Locations((-50.75, -34.75)):
            Rectangle(SKETCH12_W, SKETCH12_H)
    extrude(amount=-CUT_EXTRUDE4_DEPTH, mode=Mode.SUBTRACT)

    # Sketch14 → Cut-Extrude5 (cut)
    with BuildSketch(Plane(origin=(0, 3, 0), x_dir=(1, 0, 0), z_dir=(0, 1, 0))):
        with Locations((51.75, 0.407028855)):
            Rectangle(SKETCH14_W, SKETCH14_H)
    extrude(amount=-CUT_EXTRUDE5_DEPTH, mode=Mode.SUBTRACT)

    # Sketch15 → Boss-Extrude9 (add)
    with BuildSketch(Plane(origin=(0, 3, 0), x_dir=(1, 0, 0), z_dir=(0, 1, 0))):
        with Locations((15.5, 20.75)):
            Circle(SKETCH15_R)
        with Locations((15.5, 20.75)):
            Circle(SKETCH15_R_2, mode=Mode.SUBTRACT)
        with Locations((-20.5, 20.75)):
            Circle(SKETCH15_R)
        with Locations((-20.5, 20.75)):
            Circle(SKETCH15_R_2, mode=Mode.SUBTRACT)
    extrude(amount=BOSS_EXTRUDE9_DEPTH)

    # Sketch16 → Cut-Extrude6 (cut)
    with BuildSketch(Plane(origin=(0, 3, 0), x_dir=(1, 0, 0), z_dir=(0, 1, 0))):
        with Locations((15.5, 20.75)):
            Circle(SKETCH16_R)
        with Locations((-20.5, 20.75)):
            Circle(SKETCH16_R)
    extrude(amount=-CUT_EXTRUDE6_DEPTH, mode=Mode.SUBTRACT)

    # Sketch17 → Cut-Extrude7 (cut)
    with BuildSketch(Plane(origin=(0, 3, 0), x_dir=(1, 0, 0), z_dir=(0, 1, 0))):
        with Locations((38.25, -7.75)):
            Circle(SKETCH17_R)
    extrude(amount=-CUT_EXTRUDE7_DEPTH, mode=Mode.SUBTRACT)

    # Sketch18 → Cut-Extrude8 (cut)
    with BuildSketch(Plane(origin=(0, 6, 0), x_dir=(1, 0, 0), z_dir=(0, 1, 0))):
        with Locations((6.5, 5.25)):
            Rectangle(SKETCH18_W, SKETCH18_H)
        with Locations((-11.5, 5.25)):
            Rectangle(SKETCH18_W, SKETCH18_H)
    extrude(amount=-CUT_EXTRUDE8_DEPTH, mode=Mode.SUBTRACT)

    # Sketch19 → Cut-Extrude9 (cut)
    with BuildSketch(Plane(origin=(0, 3, 0), x_dir=(1, 0, 0), z_dir=(0, 1, 0))):
        with Locations((41.035, -34.25)):
            Circle(SKETCH19_R)
        with Locations((-44.73, -34.25)):
            Circle(SKETCH19_R)
    extrude(amount=-CUT_EXTRUDE9_DEPTH, mode=Mode.SUBTRACT)

    # Sketch20 → Cut-Extrude10 (cut)
    with BuildSketch(Plane(origin=(0, 3, 0), x_dir=(1, 0, 0), z_dir=(0, 1, 0))):
        with Locations((48.25, 0)):
            Rectangle(SKETCH20_W, SKETCH20_H)
    extrude(amount=-CUT_EXTRUDE10_DEPTH, mode=Mode.SUBTRACT)

    # Sketch21 → Boss-Extrude10 (add)
    with BuildSketch(Plane(origin=(0, 3, 0), x_dir=(1, 0, 0), z_dir=(0, 1, 0))):
        with Locations((38.75, -29.75)):
            Rectangle(SKETCH21_W, SKETCH21_H)
    extrude(amount=-BOSS_EXTRUDE10_DEPTH)


solid = part.part
